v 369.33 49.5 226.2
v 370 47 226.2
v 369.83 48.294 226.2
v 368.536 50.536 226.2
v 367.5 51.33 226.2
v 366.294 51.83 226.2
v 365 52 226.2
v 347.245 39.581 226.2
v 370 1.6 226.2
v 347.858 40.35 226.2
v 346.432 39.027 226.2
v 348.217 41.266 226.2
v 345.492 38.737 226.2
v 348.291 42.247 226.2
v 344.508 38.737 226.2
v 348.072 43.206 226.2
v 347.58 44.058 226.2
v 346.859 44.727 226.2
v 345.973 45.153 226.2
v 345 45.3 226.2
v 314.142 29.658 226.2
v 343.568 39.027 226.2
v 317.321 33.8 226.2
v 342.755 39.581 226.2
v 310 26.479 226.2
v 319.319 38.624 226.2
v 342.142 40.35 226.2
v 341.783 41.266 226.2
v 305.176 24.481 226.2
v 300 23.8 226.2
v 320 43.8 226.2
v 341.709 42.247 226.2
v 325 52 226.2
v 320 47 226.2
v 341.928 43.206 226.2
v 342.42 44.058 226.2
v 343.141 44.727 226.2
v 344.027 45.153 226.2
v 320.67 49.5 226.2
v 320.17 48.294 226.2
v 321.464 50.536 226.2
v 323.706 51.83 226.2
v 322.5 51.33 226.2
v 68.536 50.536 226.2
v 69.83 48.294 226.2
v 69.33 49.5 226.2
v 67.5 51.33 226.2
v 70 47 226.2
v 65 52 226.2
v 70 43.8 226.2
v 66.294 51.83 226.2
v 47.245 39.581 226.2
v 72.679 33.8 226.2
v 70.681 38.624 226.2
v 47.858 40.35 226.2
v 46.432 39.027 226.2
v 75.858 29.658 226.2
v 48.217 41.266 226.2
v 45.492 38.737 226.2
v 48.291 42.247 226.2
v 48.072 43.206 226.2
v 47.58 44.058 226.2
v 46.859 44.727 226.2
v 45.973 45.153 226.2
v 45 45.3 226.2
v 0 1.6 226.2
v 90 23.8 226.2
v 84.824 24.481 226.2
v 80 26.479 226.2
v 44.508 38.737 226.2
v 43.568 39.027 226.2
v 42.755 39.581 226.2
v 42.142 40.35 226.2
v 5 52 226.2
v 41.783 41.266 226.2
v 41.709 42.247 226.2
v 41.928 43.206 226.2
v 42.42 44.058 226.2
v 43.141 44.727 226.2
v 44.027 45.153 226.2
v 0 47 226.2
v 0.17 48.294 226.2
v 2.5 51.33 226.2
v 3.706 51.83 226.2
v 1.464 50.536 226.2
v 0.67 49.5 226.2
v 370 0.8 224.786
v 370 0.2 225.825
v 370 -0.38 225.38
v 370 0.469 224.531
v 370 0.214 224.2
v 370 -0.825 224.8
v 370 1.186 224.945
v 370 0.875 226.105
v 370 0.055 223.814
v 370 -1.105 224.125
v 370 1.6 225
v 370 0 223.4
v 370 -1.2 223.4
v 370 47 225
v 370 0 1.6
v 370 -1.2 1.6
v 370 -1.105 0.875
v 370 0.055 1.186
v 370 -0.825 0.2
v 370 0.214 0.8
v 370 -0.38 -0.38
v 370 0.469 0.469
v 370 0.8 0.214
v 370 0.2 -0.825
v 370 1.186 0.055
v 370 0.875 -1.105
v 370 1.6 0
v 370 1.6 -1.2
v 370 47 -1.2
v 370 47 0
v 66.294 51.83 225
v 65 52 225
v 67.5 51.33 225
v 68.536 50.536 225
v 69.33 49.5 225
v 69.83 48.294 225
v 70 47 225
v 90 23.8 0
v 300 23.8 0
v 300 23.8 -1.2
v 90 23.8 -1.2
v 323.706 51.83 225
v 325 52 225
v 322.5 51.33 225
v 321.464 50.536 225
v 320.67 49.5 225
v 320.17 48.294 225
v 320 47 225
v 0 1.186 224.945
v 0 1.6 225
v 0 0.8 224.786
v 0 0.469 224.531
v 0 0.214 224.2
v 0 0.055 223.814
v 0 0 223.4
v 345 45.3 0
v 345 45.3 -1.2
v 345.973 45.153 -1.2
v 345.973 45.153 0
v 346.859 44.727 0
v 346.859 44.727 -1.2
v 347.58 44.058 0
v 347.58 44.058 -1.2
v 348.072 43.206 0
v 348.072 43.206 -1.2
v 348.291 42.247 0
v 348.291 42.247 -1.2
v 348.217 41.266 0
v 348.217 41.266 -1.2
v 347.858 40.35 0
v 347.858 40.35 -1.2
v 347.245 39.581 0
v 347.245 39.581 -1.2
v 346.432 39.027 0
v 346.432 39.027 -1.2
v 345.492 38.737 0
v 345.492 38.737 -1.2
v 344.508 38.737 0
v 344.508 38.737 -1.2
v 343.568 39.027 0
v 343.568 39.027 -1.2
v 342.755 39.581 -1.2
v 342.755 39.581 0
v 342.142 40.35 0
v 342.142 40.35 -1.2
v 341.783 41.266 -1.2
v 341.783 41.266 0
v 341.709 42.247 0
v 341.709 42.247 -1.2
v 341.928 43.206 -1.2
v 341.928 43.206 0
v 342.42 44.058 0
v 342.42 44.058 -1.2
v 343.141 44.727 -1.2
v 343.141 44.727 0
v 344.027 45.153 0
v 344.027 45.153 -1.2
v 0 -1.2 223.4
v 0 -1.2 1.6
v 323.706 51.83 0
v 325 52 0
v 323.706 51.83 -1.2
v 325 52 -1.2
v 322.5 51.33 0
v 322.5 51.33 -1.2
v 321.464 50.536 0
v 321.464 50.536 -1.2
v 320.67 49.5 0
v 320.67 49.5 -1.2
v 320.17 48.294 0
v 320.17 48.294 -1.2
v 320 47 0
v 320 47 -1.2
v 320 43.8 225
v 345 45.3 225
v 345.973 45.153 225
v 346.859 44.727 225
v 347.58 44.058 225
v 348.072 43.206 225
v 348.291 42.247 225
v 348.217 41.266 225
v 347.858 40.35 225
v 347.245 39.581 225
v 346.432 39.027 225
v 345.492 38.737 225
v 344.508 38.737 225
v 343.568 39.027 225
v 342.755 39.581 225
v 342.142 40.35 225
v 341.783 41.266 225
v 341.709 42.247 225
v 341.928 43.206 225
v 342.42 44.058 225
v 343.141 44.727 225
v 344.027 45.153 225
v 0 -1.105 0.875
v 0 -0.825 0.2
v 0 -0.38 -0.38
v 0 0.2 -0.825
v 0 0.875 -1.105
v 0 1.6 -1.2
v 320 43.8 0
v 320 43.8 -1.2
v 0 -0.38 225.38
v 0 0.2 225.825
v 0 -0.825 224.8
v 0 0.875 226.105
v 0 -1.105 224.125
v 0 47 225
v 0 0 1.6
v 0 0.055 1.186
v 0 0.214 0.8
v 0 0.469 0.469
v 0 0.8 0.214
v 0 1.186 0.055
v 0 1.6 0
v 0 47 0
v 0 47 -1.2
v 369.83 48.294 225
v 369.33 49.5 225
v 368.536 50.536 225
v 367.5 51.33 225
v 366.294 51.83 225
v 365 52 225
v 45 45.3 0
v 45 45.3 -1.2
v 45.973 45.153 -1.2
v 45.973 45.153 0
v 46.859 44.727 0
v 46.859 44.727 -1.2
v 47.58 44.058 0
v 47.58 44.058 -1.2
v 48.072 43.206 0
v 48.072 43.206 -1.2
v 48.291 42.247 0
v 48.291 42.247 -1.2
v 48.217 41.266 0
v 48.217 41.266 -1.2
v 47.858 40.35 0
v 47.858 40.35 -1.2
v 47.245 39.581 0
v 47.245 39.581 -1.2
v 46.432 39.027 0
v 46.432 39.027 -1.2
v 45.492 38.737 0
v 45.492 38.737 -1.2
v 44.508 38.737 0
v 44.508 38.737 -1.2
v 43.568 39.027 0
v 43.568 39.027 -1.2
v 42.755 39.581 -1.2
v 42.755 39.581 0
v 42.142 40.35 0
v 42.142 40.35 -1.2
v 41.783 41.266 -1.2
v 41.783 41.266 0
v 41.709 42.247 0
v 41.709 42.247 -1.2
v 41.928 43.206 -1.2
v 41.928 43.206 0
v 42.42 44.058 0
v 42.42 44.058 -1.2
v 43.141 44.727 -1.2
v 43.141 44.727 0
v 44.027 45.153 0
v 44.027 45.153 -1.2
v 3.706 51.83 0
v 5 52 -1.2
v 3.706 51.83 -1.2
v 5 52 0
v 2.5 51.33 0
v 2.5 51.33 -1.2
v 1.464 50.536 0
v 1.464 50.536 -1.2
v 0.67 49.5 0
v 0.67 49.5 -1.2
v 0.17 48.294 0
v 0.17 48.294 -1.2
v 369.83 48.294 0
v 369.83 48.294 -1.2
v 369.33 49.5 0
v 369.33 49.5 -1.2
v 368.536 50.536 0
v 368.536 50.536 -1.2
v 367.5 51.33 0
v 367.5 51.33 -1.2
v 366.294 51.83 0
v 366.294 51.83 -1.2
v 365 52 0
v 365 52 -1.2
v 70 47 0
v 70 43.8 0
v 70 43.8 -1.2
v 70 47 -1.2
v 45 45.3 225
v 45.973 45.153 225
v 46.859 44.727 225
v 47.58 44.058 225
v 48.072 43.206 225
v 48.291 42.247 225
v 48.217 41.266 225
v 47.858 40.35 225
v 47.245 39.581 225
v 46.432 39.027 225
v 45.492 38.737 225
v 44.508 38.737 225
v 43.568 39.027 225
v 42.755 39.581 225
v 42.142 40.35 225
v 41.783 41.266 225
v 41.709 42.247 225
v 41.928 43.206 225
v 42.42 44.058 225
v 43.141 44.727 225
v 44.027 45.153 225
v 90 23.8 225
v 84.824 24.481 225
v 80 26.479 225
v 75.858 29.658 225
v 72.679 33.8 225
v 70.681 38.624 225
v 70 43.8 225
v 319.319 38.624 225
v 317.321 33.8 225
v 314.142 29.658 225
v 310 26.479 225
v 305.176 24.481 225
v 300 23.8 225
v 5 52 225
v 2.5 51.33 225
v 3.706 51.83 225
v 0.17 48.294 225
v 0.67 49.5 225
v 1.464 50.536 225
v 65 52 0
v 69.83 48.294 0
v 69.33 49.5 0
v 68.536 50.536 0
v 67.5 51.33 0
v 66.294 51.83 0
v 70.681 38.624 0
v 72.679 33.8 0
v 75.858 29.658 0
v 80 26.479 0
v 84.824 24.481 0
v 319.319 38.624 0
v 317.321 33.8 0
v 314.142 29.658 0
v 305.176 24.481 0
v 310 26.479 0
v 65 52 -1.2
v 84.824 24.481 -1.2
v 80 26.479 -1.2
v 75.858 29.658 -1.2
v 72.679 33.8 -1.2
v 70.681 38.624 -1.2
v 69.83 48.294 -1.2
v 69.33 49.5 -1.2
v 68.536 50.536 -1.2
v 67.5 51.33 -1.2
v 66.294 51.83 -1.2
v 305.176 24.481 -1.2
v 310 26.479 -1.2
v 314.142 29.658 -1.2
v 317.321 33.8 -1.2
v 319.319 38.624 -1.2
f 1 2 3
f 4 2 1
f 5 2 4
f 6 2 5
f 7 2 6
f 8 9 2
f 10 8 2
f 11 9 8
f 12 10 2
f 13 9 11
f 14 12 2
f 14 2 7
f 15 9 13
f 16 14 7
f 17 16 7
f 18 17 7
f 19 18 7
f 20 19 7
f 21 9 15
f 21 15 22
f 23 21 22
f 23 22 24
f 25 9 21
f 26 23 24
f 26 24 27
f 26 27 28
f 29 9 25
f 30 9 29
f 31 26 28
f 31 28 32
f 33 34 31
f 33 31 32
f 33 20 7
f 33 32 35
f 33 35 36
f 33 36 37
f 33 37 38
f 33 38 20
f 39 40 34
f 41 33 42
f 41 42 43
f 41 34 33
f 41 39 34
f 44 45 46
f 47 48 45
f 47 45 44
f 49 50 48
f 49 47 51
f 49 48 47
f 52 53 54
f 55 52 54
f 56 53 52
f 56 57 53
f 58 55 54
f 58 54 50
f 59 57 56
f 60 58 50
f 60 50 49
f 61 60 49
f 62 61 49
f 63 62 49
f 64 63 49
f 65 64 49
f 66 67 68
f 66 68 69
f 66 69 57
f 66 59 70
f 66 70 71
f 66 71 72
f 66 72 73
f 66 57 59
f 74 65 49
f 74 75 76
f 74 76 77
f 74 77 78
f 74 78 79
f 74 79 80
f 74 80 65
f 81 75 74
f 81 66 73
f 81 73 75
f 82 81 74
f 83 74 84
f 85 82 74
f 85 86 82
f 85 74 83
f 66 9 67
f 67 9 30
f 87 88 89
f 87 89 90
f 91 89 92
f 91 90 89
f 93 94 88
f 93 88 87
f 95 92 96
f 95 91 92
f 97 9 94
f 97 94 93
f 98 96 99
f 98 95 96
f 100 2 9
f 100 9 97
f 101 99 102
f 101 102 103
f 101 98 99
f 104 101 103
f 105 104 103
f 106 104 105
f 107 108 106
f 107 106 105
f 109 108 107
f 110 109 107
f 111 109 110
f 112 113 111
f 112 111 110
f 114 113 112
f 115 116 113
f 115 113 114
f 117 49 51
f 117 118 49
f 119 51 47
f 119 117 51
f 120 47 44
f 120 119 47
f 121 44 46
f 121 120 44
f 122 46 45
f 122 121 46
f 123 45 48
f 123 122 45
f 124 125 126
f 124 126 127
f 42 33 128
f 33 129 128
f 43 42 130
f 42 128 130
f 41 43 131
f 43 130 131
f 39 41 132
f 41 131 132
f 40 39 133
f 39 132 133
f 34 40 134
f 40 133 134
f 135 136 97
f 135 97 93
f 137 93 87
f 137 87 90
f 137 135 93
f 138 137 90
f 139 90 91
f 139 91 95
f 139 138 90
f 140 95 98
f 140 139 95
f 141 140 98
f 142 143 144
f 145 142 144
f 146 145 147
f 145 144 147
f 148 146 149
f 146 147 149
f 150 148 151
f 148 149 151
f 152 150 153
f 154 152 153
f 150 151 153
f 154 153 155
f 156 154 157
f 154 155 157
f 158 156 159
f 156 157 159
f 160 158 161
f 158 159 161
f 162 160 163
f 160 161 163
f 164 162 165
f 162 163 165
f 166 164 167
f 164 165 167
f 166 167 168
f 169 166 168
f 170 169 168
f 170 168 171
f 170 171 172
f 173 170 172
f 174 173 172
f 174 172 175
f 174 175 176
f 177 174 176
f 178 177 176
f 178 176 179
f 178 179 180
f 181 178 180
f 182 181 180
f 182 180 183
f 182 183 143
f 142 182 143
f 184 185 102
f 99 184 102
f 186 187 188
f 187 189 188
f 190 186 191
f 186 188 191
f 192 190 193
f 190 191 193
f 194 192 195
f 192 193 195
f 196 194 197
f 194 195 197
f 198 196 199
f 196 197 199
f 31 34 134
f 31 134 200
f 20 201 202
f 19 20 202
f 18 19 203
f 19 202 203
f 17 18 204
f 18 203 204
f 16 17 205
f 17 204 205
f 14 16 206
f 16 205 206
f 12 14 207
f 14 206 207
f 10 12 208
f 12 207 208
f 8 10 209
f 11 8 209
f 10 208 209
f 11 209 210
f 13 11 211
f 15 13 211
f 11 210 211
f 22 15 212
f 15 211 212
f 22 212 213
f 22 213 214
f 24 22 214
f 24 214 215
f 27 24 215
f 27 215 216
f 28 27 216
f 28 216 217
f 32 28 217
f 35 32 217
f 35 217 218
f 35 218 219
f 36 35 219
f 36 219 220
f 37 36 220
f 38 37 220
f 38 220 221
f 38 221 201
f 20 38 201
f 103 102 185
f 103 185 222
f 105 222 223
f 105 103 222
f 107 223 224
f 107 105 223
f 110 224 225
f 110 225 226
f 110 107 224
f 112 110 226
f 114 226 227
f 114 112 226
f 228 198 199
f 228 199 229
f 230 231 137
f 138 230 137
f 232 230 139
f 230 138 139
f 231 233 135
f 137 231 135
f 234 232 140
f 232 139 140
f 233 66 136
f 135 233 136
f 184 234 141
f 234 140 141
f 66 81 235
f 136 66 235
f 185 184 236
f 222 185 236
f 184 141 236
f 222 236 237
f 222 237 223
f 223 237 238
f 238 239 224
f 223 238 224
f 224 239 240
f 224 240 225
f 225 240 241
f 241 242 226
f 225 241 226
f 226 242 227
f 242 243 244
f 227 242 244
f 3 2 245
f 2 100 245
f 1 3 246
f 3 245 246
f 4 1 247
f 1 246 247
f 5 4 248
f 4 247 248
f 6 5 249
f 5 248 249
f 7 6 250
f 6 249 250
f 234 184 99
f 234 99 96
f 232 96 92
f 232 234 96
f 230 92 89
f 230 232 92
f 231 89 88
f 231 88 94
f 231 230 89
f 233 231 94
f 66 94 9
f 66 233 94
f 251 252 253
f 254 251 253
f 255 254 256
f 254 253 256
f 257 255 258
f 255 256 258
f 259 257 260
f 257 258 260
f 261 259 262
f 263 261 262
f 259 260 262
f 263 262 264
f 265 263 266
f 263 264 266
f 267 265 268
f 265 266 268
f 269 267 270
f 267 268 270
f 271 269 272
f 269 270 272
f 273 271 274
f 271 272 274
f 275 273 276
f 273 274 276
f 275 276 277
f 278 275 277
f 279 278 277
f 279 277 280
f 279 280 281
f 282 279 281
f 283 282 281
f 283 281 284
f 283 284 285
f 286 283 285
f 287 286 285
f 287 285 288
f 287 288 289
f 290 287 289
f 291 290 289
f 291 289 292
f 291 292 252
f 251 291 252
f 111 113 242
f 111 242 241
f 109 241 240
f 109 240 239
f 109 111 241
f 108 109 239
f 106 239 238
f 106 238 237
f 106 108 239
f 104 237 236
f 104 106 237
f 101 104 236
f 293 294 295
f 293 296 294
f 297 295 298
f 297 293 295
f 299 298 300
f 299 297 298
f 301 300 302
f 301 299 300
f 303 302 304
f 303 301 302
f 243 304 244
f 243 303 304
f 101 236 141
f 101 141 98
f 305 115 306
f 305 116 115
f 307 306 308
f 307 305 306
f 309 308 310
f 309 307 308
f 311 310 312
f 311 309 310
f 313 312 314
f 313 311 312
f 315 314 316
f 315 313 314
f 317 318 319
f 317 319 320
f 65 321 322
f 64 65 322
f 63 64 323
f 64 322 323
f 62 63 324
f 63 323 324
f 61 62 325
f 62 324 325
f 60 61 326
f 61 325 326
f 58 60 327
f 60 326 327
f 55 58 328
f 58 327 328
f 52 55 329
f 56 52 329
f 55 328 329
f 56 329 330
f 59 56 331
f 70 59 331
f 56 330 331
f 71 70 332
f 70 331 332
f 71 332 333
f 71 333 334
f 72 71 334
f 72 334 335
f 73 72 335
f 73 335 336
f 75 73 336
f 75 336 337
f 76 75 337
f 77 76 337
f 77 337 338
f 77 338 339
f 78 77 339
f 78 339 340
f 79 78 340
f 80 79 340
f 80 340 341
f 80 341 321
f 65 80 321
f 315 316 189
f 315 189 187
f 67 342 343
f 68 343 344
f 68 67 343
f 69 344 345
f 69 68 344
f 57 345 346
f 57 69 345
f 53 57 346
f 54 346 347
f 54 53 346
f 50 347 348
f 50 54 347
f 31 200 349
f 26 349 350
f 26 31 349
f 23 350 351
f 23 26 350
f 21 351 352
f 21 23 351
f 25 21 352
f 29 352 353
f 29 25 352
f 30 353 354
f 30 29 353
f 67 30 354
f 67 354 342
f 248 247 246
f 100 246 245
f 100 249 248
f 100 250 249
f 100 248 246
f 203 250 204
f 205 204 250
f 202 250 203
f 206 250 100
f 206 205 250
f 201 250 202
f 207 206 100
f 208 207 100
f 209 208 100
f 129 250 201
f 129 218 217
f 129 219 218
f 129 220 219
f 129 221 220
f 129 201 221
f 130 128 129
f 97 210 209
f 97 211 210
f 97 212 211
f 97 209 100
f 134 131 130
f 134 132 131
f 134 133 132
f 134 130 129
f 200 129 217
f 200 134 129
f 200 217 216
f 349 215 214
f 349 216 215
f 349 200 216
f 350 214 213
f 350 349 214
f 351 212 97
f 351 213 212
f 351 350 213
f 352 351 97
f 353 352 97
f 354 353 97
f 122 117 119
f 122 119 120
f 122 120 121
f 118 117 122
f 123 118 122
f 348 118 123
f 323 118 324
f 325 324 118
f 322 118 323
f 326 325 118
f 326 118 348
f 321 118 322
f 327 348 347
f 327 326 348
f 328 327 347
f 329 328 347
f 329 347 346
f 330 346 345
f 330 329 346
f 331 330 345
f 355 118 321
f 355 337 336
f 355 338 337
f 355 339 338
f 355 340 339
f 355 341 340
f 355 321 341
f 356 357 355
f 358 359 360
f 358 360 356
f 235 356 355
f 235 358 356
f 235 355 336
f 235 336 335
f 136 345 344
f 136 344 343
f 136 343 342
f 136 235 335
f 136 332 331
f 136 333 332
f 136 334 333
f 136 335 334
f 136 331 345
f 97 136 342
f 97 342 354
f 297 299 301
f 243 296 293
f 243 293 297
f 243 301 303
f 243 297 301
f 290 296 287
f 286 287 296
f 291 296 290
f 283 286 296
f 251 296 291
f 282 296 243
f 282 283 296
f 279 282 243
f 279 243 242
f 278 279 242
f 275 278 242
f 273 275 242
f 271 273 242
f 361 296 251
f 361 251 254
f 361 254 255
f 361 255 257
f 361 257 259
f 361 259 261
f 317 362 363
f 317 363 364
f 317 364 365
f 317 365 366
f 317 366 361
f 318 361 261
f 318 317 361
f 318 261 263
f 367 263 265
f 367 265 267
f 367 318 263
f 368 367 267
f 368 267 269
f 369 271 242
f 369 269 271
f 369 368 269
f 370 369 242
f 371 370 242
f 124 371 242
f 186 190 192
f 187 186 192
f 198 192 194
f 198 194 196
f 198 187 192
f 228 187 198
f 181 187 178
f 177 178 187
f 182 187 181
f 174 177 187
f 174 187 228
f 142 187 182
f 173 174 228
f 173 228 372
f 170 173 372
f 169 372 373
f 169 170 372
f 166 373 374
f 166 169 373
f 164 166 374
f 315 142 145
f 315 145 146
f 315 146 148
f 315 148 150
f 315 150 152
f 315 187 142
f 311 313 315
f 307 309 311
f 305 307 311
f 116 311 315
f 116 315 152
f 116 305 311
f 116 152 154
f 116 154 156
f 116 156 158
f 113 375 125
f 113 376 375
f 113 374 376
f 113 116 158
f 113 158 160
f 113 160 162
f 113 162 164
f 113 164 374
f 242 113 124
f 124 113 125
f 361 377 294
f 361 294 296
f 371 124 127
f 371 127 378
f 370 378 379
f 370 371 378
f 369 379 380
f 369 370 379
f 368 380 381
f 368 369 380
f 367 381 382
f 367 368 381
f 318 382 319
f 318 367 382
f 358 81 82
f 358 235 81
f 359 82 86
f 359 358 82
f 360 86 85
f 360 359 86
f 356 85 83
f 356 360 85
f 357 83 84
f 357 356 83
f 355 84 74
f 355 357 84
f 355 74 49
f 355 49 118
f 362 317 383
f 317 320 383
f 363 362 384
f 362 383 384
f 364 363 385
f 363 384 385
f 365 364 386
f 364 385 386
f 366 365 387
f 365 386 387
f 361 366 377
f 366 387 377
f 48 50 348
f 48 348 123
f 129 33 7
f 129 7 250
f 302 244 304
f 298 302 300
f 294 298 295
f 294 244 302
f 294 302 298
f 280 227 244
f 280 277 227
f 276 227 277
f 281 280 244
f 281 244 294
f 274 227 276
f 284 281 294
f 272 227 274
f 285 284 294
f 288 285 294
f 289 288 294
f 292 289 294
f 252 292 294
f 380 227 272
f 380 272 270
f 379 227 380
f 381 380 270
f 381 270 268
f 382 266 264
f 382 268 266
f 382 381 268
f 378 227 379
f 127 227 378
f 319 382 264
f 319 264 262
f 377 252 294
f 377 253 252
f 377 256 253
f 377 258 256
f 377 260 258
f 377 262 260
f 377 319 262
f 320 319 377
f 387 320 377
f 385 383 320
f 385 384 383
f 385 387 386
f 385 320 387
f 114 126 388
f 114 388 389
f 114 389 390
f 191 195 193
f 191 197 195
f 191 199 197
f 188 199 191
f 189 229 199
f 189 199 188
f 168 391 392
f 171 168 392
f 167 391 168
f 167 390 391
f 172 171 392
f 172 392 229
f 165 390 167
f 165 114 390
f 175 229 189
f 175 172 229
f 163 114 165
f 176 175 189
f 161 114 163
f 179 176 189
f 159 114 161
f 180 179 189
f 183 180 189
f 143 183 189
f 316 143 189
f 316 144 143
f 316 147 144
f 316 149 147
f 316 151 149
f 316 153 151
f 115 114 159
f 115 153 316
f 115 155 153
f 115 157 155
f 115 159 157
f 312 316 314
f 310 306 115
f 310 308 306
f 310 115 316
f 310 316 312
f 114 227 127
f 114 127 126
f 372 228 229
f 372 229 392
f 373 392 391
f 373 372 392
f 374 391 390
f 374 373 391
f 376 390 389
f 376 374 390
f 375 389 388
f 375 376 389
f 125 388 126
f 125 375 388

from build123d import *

# Parameters (mm, degrees)
SKETCH_1_W                         = 370
SKETCH_1_H                         = 1.2
SM_BASE_FLANGE_1_DEPTH             = 225
SM_EDGE_FLANGE_1_STRIP_W           = 8
SM_EDGE_FLANGE_1_STRIP_H           = 1.2
SM_EDGE_FLANGE_1_STRIP_CUT_DEPTH   = 370
SM_EDGE_FLANGE_1_STRIP_2_W         = 8
SM_EDGE_FLANGE_1_STRIP_2_H         = 1.2
SM_EDGE_FLANGE_1_STRIP_CUT_2_DEPTH = 370
SM_EDGE_FLANGE_1_DEPTH             = 370
SM_EDGE_FLANGE_1_BEND_DEPTH        = 370
CUT_EXTRUDE_1_DEPTH                = 438.395427502
FILLET_1_R                         = 5
SKETCH_17_R                        = 3.3
CUT_EXTRUDE_2_DEPTH                = 438.395427502


# Sheet-metal steps are written as plain solids
with BuildPart() as part:
    # Sketch 1 → Базовая кромка1 (new body)
    with BuildSketch(Plane.XY):
        with Locations((185, -0.6)):
            Rectangle(SKETCH_1_W, SKETCH_1_H)
    extrude(amount=SM_BASE_FLANGE_1_DEPTH)

    # Ребро-кромка1 strip (across the edge) → Ребро-кромка1 strip cut (cut)
    with BuildSketch(Plane(origin=(0, 0, 225), x_dir=(0, 0, -1), z_dir=(1, 0, 0))):
        with Locations((-2.4, -0.6)):
            Rectangle(SM_EDGE_FLANGE_1_STRIP_W, SM_EDGE_FLANGE_1_STRIP_H)
    extrude(amount=SM_EDGE_FLANGE_1_STRIP_CUT_DEPTH, mode=Mode.SUBTRACT)

    # Ребро-кромка1 strip 2 (across the edge) → Ребро-кромка1 strip cut 2 (cut)
    with BuildSketch(Plane.ZY.offset(-370)):
        with Locations((-2.4, -0.6)):
            Rectangle(SM_EDGE_FLANGE_1_STRIP_2_W, SM_EDGE_FLANGE_1_STRIP_2_H)
    extrude(amount=SM_EDGE_FLANGE_1_STRIP_CUT_2_DEPTH, mode=Mode.SUBTRACT)

    # Ребро-кромка1 section (across the edge) → Ребро-кромка1 (add)
    with BuildSketch(Plane(origin=(0, 0, 225), x_dir=(0, 0, -1), z_dir=(1, 0, 0))):
        with BuildLine():
            Line((-1.2, 1.6), (-1.2, 52))
            Line((-1.2, 52), (0, 52))
            Line((0, 52), (0, 1.6))
            ThreePointArc((0, 1.6), (0.46862915, 0.46862915), (1.6, 0))
            Line((1.6, 0), (1.6, -1.2))
            ThreePointArc((1.6, -1.2), (-0.379898987, -0.379898987), (-1.2, 1.6))
        make_face()
    extrude(amount=SM_EDGE_FLANGE_1_DEPTH)

    # Ребро-кромка1 section 2 (across the edge) → Ребро-кромка1 bend (add)
    with BuildSketch(Plane.ZY.offset(-370)):
        with BuildLine():
            Line((-1.2, 1.6), (-1.2, 52))
            Line((-1.2, 52), (0, 52))
            Line((0, 52), (0, 1.6))
            ThreePointArc((0, 1.6), (0.46862915, 0.46862915), (1.6, 0))
            Line((1.6, 0), (1.6, -1.2))
            ThreePointArc((1.6, -1.2), (-0.379898987, -0.379898987), (-1.2, 1.6))
        make_face()
    extrude(amount=SM_EDGE_FLANGE_1_BEND_DEPTH)

    # Эскиз14 → Вырез-Вытянуть1 (cut, through all)
    with BuildSketch(Plane.XY.offset(226.2)):
        with BuildLine():
            Line((70, 52), (320, 52))
            Line((320, 52), (320, 43.8))
            ThreePointArc((320, 43.8), (314.142135624, 29.657864376), (300, 23.8))
            Line((300, 23.8), (90, 23.8))
            ThreePointArc((90, 23.8), (75.857864376, 29.657864376), (70, 43.8))
            Line((70, 43.8), (70, 52))
        make_face()
    extrude(amount=-CUT_EXTRUDE_1_DEPTH, mode=Mode.SUBTRACT)

    # Скругление1
    fillet_1_edges = [part.edges().sort_by_distance(p)[0] for p in [
        (0, 52, 225.6),
        (370, 52, 225.6),
        (370, 52, -0.6),
        (0, 52, -0.6),
        (70, 52, 225.6),
        (320, 52, 225.6),
        (70, 52, -0.6),
        (320, 52, -0.6),
    ]]
    fillet(fillet_1_edges, radius=FILLET_1_R)

    # Эскиз17 → Вырез-Вытянуть2 (cut, through all)
    with BuildSketch(Plane(origin=(0, 0, -1.2), x_dir=(-1, 0, 0), z_dir=(0, 0, -1))):
        with Locations(Location((-345, 42, 0), (0, 0, 90))):
            Circle(SKETCH_17_R)
        with Locations(Location((-45, 42, 0), (0, 0, 90))):
            Circle(SKETCH_17_R)
    extrude(amount=-CUT_EXTRUDE_2_DEPTH, mode=Mode.SUBTRACT)


solid = part.part
